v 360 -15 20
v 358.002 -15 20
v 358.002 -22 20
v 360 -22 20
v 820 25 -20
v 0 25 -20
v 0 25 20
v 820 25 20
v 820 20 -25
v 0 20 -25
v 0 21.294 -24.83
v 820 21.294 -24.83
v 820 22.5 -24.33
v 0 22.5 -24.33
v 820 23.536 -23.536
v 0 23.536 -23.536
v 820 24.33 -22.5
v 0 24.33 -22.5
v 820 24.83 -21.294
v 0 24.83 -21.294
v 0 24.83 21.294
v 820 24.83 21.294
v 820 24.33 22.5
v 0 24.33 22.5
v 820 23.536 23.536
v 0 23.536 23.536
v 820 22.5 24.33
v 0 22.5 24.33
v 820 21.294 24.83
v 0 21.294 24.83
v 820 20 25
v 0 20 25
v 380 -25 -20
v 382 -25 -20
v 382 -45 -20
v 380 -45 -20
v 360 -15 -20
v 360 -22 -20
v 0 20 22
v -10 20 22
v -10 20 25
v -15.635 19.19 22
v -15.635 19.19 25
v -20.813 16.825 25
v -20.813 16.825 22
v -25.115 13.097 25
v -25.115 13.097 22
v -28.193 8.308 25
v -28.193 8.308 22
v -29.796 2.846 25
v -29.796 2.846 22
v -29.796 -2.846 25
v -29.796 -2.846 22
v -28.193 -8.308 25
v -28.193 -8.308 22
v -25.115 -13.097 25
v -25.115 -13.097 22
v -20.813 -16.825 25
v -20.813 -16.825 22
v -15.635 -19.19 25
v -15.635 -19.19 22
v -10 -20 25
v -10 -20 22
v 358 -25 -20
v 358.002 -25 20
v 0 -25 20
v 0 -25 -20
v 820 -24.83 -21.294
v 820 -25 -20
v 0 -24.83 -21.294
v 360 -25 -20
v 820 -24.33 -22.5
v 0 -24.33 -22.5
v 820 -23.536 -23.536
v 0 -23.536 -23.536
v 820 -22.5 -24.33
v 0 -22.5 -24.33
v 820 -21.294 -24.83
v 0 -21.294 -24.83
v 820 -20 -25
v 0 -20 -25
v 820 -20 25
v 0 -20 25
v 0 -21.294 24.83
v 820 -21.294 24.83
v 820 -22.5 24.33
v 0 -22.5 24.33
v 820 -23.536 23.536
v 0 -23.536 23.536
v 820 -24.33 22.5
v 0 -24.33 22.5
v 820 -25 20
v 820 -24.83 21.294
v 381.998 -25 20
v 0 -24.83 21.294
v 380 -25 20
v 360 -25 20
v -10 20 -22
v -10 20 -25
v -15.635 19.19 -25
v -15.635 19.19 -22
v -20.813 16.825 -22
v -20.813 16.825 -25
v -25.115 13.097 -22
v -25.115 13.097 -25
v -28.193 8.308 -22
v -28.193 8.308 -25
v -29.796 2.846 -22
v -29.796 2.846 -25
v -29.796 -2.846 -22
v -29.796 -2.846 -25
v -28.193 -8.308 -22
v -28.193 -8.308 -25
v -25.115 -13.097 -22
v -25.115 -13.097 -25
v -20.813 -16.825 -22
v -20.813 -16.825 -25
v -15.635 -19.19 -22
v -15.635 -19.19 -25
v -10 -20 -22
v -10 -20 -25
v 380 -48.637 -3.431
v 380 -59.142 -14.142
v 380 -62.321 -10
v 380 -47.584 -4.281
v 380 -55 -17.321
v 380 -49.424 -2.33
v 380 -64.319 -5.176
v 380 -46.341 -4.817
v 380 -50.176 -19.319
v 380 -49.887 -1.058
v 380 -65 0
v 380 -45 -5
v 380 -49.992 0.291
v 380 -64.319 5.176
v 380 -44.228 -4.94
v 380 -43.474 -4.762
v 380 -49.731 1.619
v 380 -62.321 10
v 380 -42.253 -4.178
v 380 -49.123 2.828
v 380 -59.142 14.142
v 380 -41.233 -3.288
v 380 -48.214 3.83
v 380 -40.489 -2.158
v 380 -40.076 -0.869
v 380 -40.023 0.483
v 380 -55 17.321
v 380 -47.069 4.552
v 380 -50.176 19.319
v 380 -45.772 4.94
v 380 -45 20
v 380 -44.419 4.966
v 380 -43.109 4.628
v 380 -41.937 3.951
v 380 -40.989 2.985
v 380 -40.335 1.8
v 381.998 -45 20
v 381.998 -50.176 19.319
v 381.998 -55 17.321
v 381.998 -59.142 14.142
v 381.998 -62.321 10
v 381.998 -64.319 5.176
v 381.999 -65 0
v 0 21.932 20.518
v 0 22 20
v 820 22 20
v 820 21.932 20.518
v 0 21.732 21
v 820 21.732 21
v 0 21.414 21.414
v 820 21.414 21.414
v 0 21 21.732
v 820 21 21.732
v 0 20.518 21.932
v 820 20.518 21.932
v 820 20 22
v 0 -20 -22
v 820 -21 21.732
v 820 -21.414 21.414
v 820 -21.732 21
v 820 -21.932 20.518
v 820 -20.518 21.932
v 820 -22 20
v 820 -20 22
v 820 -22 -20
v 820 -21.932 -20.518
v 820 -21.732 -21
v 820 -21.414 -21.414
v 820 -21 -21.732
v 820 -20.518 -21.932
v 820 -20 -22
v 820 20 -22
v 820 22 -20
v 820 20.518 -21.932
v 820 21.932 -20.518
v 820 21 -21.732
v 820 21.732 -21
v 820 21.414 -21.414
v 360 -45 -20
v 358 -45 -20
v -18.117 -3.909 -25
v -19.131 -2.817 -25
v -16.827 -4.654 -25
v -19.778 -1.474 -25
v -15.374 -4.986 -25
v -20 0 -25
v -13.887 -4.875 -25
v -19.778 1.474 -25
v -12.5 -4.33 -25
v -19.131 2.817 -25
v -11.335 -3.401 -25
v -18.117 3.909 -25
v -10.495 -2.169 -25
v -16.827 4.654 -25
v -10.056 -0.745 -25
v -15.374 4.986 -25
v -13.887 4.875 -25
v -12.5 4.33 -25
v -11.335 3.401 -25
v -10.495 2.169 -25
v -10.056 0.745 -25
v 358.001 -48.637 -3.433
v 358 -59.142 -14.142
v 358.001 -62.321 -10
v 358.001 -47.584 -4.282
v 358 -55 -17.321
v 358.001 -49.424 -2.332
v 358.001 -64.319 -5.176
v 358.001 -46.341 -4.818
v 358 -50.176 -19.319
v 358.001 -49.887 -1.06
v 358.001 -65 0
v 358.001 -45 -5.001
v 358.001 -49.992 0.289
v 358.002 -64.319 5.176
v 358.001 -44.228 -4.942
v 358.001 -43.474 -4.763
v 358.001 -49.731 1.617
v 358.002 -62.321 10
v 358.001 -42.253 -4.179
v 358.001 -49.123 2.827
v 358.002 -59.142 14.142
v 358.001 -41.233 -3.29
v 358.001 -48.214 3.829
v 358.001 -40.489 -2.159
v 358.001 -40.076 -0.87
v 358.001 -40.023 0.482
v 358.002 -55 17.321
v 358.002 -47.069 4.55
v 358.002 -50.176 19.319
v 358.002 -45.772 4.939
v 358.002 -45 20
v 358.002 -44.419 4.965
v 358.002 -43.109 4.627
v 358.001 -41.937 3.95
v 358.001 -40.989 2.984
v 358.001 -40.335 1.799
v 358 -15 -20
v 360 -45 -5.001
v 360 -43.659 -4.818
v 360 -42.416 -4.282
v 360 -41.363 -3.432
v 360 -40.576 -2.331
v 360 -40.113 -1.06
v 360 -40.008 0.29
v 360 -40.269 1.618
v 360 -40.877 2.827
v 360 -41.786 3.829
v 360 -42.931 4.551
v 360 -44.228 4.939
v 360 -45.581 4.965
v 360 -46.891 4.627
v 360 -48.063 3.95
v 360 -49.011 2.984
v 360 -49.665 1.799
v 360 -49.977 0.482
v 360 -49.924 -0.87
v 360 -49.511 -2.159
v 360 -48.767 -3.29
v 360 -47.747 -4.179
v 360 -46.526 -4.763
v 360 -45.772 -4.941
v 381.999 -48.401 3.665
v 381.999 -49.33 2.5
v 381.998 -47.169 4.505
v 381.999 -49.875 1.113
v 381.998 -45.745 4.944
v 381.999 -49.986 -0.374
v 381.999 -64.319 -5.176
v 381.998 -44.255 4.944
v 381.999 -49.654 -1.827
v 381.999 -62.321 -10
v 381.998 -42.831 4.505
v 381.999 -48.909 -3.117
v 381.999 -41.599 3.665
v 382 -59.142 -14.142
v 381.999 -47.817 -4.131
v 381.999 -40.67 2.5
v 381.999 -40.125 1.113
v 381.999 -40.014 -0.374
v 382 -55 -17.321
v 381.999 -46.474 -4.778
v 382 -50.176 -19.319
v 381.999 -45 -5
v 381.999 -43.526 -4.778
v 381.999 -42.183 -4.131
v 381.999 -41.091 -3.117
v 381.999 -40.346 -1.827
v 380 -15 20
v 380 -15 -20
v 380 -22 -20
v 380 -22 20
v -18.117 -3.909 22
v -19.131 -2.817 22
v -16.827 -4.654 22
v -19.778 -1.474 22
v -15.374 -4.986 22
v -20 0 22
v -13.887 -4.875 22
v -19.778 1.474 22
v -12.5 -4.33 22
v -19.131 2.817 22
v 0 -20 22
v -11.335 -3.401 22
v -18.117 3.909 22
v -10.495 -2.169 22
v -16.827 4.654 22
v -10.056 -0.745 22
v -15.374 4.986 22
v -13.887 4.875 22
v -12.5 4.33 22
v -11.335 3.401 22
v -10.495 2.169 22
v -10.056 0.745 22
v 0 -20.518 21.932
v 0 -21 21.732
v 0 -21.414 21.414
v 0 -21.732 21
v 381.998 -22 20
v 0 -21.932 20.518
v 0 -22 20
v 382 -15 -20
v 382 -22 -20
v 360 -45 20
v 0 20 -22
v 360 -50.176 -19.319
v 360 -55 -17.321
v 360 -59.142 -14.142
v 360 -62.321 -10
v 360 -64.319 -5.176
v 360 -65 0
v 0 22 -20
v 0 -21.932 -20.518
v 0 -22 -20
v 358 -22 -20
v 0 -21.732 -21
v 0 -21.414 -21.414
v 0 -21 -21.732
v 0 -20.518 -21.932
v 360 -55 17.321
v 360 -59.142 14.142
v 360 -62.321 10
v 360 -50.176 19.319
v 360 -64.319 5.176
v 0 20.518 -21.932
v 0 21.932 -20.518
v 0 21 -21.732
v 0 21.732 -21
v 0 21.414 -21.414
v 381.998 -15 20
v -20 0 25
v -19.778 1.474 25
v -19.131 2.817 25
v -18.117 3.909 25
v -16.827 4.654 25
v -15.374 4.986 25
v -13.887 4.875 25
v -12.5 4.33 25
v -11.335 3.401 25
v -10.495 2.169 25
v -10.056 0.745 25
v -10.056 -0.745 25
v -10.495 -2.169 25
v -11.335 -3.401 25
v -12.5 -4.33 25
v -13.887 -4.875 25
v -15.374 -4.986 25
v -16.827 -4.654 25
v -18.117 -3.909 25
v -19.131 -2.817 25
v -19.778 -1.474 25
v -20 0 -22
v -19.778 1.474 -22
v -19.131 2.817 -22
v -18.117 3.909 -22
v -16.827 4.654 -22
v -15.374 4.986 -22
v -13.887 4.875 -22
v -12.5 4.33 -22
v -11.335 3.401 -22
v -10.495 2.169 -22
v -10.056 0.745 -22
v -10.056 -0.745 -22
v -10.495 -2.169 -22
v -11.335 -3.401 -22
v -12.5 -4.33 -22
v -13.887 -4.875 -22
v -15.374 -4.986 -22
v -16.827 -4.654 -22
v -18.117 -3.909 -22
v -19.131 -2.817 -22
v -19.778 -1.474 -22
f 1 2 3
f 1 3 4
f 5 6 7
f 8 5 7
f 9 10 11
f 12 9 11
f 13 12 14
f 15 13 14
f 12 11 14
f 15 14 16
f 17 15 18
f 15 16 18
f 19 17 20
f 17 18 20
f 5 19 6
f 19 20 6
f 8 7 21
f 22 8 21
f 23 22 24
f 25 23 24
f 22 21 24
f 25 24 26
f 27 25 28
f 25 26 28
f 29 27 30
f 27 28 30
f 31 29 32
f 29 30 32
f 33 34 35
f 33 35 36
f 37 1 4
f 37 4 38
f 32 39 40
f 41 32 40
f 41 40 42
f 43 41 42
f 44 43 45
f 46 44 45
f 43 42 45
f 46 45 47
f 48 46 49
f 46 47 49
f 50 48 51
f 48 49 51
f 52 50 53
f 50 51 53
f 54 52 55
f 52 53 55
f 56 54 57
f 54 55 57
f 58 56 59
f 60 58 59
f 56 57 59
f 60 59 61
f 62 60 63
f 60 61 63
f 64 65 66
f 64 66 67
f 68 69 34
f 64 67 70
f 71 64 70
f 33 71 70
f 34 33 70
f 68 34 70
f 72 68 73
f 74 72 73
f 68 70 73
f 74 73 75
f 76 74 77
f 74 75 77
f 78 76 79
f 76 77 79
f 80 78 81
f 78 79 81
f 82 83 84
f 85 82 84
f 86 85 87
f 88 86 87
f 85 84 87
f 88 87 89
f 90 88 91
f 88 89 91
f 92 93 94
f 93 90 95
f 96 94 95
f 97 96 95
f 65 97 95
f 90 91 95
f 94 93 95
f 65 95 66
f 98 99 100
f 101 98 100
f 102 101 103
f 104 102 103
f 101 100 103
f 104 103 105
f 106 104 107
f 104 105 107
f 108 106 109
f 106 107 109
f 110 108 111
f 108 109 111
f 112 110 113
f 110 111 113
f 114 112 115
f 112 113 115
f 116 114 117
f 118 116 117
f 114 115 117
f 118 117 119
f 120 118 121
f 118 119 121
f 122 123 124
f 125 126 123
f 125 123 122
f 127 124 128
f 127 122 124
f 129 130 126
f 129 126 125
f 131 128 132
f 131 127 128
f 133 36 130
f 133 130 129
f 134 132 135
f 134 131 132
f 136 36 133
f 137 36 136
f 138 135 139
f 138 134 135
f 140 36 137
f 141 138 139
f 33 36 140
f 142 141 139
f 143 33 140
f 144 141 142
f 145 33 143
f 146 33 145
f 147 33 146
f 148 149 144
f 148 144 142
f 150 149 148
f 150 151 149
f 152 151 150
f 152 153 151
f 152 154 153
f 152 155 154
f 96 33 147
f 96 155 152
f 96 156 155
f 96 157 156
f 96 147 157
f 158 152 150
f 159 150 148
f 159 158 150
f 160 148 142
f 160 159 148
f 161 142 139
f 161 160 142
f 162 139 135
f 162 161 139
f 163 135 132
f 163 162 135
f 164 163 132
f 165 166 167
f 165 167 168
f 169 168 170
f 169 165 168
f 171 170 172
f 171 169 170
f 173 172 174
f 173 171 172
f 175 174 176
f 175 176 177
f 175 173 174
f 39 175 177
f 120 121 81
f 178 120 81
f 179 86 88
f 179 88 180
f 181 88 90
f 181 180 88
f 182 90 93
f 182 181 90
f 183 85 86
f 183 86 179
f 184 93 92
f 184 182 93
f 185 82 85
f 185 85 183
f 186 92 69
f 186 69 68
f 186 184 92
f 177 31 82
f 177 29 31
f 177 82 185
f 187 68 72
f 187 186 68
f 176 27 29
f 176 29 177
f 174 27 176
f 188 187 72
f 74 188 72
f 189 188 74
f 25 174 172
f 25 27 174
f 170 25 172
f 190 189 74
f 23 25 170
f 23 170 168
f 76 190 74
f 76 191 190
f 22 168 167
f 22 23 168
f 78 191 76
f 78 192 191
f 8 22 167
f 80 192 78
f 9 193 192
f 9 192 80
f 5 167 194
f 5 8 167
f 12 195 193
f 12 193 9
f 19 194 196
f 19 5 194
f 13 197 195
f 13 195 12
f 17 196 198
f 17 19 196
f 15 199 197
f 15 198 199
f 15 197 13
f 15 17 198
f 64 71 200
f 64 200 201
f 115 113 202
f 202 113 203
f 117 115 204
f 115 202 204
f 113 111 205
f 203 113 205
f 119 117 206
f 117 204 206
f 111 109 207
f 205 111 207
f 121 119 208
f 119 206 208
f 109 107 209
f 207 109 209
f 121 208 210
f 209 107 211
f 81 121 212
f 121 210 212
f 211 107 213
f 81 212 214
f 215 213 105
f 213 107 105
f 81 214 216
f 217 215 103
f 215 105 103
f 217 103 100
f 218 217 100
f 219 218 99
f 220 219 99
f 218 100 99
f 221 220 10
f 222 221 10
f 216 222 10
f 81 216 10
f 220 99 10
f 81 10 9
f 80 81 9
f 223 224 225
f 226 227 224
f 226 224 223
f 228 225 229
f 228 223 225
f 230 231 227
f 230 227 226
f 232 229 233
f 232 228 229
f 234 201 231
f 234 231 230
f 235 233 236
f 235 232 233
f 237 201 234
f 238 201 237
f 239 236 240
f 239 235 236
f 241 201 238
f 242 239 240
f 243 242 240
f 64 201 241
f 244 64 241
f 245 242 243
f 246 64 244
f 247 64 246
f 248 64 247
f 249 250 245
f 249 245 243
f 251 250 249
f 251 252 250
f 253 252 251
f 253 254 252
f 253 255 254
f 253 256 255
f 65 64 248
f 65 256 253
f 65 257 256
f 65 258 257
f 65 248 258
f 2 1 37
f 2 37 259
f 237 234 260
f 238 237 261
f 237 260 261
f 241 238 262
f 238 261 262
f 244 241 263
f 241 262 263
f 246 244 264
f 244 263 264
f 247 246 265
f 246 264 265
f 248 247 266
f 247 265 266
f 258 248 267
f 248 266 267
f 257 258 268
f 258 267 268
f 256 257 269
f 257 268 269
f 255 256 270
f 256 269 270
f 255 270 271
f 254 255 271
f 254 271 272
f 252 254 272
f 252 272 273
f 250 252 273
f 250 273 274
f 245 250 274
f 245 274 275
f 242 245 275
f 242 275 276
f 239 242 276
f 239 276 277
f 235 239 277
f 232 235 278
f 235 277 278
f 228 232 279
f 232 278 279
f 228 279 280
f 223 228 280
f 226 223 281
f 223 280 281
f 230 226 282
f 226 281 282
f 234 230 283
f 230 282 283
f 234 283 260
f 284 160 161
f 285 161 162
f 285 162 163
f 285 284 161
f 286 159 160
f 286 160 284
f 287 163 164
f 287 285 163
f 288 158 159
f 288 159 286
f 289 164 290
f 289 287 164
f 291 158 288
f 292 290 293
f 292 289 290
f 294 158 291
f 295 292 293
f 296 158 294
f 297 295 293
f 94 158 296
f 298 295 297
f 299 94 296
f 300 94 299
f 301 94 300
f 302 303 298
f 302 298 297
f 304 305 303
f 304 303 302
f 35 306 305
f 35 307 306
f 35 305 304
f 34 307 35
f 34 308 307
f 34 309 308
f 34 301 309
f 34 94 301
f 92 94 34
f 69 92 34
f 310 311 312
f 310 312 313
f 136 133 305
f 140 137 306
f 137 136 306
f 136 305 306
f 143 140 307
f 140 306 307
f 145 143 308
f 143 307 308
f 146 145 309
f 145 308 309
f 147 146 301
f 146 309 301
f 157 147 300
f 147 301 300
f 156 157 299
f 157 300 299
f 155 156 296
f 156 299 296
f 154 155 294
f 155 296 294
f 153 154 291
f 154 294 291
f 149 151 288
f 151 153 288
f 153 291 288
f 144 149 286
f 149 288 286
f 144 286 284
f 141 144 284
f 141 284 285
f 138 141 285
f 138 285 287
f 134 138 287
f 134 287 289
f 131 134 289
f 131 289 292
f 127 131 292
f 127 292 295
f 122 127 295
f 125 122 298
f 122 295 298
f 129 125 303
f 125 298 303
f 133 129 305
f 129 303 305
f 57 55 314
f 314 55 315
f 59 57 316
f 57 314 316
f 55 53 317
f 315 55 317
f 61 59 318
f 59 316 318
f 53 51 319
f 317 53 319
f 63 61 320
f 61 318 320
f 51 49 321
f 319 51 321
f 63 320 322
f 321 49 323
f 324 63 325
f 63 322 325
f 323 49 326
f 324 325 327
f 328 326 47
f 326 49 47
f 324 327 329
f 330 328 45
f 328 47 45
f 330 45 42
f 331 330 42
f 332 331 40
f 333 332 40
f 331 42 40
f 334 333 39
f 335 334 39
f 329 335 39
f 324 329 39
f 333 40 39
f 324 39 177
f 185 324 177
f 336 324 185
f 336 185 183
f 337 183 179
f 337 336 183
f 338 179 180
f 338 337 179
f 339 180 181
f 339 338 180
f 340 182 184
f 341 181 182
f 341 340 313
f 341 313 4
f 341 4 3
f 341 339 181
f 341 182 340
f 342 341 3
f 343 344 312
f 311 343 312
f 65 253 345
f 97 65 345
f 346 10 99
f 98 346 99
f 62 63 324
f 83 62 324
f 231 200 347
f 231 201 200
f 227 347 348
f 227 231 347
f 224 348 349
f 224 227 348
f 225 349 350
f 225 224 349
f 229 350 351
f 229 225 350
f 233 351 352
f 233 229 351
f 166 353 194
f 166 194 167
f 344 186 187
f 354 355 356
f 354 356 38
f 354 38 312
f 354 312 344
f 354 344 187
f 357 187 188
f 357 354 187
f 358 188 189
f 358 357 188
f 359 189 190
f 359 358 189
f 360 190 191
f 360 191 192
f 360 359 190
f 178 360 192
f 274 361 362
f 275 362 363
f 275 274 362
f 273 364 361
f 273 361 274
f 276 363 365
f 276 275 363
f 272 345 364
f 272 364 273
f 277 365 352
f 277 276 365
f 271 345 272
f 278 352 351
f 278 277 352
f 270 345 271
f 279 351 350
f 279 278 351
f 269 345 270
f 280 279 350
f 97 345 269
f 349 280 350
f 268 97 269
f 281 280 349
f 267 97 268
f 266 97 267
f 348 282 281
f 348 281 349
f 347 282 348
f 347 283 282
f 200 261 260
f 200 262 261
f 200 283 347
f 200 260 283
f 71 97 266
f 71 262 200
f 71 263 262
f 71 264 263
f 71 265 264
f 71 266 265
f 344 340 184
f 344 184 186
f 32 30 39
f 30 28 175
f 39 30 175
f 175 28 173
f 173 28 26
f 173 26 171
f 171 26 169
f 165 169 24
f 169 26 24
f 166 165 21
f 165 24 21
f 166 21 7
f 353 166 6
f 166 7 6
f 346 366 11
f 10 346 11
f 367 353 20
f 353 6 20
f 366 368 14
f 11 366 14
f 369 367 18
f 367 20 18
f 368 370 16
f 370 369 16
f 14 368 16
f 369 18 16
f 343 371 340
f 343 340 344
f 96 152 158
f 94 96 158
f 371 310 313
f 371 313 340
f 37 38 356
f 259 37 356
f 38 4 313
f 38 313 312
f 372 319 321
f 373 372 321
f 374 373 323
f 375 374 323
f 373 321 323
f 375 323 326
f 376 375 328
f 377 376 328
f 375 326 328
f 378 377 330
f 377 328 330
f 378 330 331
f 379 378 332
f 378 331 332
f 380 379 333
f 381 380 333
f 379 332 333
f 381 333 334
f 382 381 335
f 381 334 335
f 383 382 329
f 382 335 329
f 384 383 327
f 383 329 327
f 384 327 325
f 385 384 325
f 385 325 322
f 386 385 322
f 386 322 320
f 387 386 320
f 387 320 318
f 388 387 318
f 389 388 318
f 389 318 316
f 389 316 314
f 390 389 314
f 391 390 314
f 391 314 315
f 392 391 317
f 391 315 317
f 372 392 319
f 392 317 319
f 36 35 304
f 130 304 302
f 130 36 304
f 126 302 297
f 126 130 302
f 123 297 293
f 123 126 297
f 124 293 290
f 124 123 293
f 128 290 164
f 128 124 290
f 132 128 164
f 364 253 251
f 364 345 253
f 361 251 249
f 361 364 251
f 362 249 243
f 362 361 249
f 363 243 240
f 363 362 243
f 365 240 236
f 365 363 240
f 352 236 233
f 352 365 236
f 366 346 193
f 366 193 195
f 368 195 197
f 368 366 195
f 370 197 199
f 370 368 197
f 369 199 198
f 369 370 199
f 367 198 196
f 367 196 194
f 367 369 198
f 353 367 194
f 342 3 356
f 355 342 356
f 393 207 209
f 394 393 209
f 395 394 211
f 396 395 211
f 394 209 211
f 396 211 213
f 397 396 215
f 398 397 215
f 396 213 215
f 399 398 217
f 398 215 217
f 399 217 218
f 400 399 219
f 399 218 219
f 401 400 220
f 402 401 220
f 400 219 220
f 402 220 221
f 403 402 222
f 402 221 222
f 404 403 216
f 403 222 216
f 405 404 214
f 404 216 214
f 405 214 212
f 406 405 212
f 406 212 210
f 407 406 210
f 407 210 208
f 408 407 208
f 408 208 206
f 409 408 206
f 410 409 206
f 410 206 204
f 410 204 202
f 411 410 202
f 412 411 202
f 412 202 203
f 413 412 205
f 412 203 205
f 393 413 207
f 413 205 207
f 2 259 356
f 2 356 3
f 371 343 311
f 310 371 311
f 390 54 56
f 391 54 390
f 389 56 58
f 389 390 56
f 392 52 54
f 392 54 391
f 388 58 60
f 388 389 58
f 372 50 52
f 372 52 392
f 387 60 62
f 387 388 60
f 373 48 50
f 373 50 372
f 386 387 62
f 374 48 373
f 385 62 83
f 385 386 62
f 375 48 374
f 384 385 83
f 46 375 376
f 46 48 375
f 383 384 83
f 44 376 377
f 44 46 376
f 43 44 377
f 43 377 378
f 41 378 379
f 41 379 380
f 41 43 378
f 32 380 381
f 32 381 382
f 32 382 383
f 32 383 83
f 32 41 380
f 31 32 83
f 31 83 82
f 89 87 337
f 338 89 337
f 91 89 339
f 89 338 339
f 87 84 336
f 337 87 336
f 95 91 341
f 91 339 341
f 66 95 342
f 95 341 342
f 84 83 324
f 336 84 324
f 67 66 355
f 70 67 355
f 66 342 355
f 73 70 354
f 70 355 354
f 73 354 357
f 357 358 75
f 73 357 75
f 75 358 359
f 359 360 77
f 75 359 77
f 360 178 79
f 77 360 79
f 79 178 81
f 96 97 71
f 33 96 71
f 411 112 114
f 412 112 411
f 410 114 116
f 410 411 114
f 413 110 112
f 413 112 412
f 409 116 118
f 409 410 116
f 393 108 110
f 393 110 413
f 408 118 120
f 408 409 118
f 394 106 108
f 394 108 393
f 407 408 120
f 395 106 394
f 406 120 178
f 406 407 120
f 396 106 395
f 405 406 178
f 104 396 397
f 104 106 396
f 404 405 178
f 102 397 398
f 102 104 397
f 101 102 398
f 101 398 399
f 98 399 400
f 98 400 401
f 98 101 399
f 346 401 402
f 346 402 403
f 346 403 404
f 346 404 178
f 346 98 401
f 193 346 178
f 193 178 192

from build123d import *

# Parameters (mm, degrees)
EXTRUDE_THIN1_DEPTH      = 820
SKETCH3_R                = 5
BOSS_EXTRUDE2_DEPTH      = 3
BOSS_EXTRUDE3_START      = -47
SKETCH3_3_R              = 5
BOSS_EXTRUDE3_DEPTH      = 3
BOSS_EXTRUDE4_DEPTH      = 40
BOSS_EXTRUDE4_DEPTH_BACK = 10
FILLET1_R                = 20
SKETCH7_R                = 5
CUT_EXTRUDE3_DEPTH       = 444.504548848


with BuildPart() as part:
    # Sketch1 → Extrude-Thin1 (new body)
    with BuildSketch(Plane(origin=(0, 0, 0), x_dir=(0, 0, -1), z_dir=(1, 0, 0))):
        with BuildLine():
            Line((-25, 20), (-25, -20))
            ThreePointArc((-25, -20), (-23.535533906, -23.535533906), (-20, -25))
            Line((-20, -25), (20, -25))
            ThreePointArc((20, -25), (23.535533906, -23.535533906), (25, -20))
            Line((25, -20), (25, 20))
            ThreePointArc((25, 20), (23.535533906, 23.535533906), (20, 25))
            Line((20, 25), (-20, 25))
            ThreePointArc((-20, 25), (-23.535533906, 23.535533906), (-25, 20))
        make_face()
        with BuildLine():
            Line((-22, 20), (-22, -20))
            ThreePointArc((-22, -20), (-21.414213562, -21.414213562), (-20, -22))
            Line((-20, -22), (20, -22))
            ThreePointArc((20, -22), (21.414213562, -21.414213562), (22, -20))
            Line((22, -20), (22, 20))
            ThreePointArc((22, 20), (21.414213562, 21.414213562), (20, 22))
            Line((20, 22), (-20, 22))
            ThreePointArc((-20, 22), (-21.414213562, 21.414213562), (-22, 20))
        make_face(mode=Mode.SUBTRACT)
    extrude(amount=EXTRUDE_THIN1_DEPTH)

    # Sketch3 → Boss-Extrude2 (add)
    with BuildSketch(Plane(origin=(0, 0, -25), x_dir=(-1, 0, 0), z_dir=(0, 0, -1))):
        with BuildLine():
            Line((0, 20), (10, 20))
            ThreePointArc((10, 20), (30, 0), (10, -20))
            Line((10, -20), (0, -20))
            Line((0, -20), (0, 20))
        make_face()
        with Locations((15, 0)):
            Circle(SKETCH3_R, mode=Mode.SUBTRACT)
    extrude(amount=-BOSS_EXTRUDE2_DEPTH)

    # Sketch3<3> → Boss-Extrude3 (add)
    with BuildSketch(Plane(origin=(0, 0, -25), x_dir=(-1, 0, 0), z_dir=(0, 0, -1)).offset(BOSS_EXTRUDE3_START)):
        with BuildLine():
            Line((0, 20), (10, 20))
            ThreePointArc((10, 20), (30, 0), (10, -20))
            Line((10, -20), (0, -20))
            Line((0, -20), (0, 20))
        make_face()
        with Locations((15, 0)):
            Circle(SKETCH3_3_R, mode=Mode.SUBTRACT)
    extrude(amount=-BOSS_EXTRUDE3_DEPTH)

    # Sketch5 → Boss-Extrude4 (add, two sides: drawn at the far end of the back side and taken through both)
    with BuildSketch(Plane.XZ.offset(25).offset(-BOSS_EXTRUDE4_DEPTH_BACK)):
        Polygon((358, -19.999999922), (358.002493701, 20), (360, 20), (360, -20), align=None)
        Polygon((380, 20), (381.997506299, 20), (382, -19.999999922), (380, -20), align=None)
    extrude(amount=BOSS_EXTRUDE4_DEPTH + BOSS_EXTRUDE4_DEPTH_BACK)

    # Fillet1
    fillet1_edges = [part.edges().sort_by_distance(p)[0] for p in [
        (380.99875315, -65, 20),
        (381, -65, -19.999999961),
        (359.00124685, -65, 20),
        (359, -65, -19.999999961),
    ]]
    fillet(fillet1_edges, radius=FILLET1_R - 0.0001)  # a hair under: the kernel refuses the full size

    # Sketch7 → Cut-Extrude3 (cut, through all)
    with BuildSketch(Plane(origin=(381.998751665, 0, 0.023814765), x_dir=(6.234251963554982e-05, 0, -0.9999999980567051), z_dir=(0.9999999980567051, 0, 6.234251963554982e-05))):
        with Locations((0.023814765, -45)):
            Circle(SKETCH7_R)
    extrude(amount=-CUT_EXTRUDE3_DEPTH, mode=Mode.SUBTRACT)


solid = part.part
